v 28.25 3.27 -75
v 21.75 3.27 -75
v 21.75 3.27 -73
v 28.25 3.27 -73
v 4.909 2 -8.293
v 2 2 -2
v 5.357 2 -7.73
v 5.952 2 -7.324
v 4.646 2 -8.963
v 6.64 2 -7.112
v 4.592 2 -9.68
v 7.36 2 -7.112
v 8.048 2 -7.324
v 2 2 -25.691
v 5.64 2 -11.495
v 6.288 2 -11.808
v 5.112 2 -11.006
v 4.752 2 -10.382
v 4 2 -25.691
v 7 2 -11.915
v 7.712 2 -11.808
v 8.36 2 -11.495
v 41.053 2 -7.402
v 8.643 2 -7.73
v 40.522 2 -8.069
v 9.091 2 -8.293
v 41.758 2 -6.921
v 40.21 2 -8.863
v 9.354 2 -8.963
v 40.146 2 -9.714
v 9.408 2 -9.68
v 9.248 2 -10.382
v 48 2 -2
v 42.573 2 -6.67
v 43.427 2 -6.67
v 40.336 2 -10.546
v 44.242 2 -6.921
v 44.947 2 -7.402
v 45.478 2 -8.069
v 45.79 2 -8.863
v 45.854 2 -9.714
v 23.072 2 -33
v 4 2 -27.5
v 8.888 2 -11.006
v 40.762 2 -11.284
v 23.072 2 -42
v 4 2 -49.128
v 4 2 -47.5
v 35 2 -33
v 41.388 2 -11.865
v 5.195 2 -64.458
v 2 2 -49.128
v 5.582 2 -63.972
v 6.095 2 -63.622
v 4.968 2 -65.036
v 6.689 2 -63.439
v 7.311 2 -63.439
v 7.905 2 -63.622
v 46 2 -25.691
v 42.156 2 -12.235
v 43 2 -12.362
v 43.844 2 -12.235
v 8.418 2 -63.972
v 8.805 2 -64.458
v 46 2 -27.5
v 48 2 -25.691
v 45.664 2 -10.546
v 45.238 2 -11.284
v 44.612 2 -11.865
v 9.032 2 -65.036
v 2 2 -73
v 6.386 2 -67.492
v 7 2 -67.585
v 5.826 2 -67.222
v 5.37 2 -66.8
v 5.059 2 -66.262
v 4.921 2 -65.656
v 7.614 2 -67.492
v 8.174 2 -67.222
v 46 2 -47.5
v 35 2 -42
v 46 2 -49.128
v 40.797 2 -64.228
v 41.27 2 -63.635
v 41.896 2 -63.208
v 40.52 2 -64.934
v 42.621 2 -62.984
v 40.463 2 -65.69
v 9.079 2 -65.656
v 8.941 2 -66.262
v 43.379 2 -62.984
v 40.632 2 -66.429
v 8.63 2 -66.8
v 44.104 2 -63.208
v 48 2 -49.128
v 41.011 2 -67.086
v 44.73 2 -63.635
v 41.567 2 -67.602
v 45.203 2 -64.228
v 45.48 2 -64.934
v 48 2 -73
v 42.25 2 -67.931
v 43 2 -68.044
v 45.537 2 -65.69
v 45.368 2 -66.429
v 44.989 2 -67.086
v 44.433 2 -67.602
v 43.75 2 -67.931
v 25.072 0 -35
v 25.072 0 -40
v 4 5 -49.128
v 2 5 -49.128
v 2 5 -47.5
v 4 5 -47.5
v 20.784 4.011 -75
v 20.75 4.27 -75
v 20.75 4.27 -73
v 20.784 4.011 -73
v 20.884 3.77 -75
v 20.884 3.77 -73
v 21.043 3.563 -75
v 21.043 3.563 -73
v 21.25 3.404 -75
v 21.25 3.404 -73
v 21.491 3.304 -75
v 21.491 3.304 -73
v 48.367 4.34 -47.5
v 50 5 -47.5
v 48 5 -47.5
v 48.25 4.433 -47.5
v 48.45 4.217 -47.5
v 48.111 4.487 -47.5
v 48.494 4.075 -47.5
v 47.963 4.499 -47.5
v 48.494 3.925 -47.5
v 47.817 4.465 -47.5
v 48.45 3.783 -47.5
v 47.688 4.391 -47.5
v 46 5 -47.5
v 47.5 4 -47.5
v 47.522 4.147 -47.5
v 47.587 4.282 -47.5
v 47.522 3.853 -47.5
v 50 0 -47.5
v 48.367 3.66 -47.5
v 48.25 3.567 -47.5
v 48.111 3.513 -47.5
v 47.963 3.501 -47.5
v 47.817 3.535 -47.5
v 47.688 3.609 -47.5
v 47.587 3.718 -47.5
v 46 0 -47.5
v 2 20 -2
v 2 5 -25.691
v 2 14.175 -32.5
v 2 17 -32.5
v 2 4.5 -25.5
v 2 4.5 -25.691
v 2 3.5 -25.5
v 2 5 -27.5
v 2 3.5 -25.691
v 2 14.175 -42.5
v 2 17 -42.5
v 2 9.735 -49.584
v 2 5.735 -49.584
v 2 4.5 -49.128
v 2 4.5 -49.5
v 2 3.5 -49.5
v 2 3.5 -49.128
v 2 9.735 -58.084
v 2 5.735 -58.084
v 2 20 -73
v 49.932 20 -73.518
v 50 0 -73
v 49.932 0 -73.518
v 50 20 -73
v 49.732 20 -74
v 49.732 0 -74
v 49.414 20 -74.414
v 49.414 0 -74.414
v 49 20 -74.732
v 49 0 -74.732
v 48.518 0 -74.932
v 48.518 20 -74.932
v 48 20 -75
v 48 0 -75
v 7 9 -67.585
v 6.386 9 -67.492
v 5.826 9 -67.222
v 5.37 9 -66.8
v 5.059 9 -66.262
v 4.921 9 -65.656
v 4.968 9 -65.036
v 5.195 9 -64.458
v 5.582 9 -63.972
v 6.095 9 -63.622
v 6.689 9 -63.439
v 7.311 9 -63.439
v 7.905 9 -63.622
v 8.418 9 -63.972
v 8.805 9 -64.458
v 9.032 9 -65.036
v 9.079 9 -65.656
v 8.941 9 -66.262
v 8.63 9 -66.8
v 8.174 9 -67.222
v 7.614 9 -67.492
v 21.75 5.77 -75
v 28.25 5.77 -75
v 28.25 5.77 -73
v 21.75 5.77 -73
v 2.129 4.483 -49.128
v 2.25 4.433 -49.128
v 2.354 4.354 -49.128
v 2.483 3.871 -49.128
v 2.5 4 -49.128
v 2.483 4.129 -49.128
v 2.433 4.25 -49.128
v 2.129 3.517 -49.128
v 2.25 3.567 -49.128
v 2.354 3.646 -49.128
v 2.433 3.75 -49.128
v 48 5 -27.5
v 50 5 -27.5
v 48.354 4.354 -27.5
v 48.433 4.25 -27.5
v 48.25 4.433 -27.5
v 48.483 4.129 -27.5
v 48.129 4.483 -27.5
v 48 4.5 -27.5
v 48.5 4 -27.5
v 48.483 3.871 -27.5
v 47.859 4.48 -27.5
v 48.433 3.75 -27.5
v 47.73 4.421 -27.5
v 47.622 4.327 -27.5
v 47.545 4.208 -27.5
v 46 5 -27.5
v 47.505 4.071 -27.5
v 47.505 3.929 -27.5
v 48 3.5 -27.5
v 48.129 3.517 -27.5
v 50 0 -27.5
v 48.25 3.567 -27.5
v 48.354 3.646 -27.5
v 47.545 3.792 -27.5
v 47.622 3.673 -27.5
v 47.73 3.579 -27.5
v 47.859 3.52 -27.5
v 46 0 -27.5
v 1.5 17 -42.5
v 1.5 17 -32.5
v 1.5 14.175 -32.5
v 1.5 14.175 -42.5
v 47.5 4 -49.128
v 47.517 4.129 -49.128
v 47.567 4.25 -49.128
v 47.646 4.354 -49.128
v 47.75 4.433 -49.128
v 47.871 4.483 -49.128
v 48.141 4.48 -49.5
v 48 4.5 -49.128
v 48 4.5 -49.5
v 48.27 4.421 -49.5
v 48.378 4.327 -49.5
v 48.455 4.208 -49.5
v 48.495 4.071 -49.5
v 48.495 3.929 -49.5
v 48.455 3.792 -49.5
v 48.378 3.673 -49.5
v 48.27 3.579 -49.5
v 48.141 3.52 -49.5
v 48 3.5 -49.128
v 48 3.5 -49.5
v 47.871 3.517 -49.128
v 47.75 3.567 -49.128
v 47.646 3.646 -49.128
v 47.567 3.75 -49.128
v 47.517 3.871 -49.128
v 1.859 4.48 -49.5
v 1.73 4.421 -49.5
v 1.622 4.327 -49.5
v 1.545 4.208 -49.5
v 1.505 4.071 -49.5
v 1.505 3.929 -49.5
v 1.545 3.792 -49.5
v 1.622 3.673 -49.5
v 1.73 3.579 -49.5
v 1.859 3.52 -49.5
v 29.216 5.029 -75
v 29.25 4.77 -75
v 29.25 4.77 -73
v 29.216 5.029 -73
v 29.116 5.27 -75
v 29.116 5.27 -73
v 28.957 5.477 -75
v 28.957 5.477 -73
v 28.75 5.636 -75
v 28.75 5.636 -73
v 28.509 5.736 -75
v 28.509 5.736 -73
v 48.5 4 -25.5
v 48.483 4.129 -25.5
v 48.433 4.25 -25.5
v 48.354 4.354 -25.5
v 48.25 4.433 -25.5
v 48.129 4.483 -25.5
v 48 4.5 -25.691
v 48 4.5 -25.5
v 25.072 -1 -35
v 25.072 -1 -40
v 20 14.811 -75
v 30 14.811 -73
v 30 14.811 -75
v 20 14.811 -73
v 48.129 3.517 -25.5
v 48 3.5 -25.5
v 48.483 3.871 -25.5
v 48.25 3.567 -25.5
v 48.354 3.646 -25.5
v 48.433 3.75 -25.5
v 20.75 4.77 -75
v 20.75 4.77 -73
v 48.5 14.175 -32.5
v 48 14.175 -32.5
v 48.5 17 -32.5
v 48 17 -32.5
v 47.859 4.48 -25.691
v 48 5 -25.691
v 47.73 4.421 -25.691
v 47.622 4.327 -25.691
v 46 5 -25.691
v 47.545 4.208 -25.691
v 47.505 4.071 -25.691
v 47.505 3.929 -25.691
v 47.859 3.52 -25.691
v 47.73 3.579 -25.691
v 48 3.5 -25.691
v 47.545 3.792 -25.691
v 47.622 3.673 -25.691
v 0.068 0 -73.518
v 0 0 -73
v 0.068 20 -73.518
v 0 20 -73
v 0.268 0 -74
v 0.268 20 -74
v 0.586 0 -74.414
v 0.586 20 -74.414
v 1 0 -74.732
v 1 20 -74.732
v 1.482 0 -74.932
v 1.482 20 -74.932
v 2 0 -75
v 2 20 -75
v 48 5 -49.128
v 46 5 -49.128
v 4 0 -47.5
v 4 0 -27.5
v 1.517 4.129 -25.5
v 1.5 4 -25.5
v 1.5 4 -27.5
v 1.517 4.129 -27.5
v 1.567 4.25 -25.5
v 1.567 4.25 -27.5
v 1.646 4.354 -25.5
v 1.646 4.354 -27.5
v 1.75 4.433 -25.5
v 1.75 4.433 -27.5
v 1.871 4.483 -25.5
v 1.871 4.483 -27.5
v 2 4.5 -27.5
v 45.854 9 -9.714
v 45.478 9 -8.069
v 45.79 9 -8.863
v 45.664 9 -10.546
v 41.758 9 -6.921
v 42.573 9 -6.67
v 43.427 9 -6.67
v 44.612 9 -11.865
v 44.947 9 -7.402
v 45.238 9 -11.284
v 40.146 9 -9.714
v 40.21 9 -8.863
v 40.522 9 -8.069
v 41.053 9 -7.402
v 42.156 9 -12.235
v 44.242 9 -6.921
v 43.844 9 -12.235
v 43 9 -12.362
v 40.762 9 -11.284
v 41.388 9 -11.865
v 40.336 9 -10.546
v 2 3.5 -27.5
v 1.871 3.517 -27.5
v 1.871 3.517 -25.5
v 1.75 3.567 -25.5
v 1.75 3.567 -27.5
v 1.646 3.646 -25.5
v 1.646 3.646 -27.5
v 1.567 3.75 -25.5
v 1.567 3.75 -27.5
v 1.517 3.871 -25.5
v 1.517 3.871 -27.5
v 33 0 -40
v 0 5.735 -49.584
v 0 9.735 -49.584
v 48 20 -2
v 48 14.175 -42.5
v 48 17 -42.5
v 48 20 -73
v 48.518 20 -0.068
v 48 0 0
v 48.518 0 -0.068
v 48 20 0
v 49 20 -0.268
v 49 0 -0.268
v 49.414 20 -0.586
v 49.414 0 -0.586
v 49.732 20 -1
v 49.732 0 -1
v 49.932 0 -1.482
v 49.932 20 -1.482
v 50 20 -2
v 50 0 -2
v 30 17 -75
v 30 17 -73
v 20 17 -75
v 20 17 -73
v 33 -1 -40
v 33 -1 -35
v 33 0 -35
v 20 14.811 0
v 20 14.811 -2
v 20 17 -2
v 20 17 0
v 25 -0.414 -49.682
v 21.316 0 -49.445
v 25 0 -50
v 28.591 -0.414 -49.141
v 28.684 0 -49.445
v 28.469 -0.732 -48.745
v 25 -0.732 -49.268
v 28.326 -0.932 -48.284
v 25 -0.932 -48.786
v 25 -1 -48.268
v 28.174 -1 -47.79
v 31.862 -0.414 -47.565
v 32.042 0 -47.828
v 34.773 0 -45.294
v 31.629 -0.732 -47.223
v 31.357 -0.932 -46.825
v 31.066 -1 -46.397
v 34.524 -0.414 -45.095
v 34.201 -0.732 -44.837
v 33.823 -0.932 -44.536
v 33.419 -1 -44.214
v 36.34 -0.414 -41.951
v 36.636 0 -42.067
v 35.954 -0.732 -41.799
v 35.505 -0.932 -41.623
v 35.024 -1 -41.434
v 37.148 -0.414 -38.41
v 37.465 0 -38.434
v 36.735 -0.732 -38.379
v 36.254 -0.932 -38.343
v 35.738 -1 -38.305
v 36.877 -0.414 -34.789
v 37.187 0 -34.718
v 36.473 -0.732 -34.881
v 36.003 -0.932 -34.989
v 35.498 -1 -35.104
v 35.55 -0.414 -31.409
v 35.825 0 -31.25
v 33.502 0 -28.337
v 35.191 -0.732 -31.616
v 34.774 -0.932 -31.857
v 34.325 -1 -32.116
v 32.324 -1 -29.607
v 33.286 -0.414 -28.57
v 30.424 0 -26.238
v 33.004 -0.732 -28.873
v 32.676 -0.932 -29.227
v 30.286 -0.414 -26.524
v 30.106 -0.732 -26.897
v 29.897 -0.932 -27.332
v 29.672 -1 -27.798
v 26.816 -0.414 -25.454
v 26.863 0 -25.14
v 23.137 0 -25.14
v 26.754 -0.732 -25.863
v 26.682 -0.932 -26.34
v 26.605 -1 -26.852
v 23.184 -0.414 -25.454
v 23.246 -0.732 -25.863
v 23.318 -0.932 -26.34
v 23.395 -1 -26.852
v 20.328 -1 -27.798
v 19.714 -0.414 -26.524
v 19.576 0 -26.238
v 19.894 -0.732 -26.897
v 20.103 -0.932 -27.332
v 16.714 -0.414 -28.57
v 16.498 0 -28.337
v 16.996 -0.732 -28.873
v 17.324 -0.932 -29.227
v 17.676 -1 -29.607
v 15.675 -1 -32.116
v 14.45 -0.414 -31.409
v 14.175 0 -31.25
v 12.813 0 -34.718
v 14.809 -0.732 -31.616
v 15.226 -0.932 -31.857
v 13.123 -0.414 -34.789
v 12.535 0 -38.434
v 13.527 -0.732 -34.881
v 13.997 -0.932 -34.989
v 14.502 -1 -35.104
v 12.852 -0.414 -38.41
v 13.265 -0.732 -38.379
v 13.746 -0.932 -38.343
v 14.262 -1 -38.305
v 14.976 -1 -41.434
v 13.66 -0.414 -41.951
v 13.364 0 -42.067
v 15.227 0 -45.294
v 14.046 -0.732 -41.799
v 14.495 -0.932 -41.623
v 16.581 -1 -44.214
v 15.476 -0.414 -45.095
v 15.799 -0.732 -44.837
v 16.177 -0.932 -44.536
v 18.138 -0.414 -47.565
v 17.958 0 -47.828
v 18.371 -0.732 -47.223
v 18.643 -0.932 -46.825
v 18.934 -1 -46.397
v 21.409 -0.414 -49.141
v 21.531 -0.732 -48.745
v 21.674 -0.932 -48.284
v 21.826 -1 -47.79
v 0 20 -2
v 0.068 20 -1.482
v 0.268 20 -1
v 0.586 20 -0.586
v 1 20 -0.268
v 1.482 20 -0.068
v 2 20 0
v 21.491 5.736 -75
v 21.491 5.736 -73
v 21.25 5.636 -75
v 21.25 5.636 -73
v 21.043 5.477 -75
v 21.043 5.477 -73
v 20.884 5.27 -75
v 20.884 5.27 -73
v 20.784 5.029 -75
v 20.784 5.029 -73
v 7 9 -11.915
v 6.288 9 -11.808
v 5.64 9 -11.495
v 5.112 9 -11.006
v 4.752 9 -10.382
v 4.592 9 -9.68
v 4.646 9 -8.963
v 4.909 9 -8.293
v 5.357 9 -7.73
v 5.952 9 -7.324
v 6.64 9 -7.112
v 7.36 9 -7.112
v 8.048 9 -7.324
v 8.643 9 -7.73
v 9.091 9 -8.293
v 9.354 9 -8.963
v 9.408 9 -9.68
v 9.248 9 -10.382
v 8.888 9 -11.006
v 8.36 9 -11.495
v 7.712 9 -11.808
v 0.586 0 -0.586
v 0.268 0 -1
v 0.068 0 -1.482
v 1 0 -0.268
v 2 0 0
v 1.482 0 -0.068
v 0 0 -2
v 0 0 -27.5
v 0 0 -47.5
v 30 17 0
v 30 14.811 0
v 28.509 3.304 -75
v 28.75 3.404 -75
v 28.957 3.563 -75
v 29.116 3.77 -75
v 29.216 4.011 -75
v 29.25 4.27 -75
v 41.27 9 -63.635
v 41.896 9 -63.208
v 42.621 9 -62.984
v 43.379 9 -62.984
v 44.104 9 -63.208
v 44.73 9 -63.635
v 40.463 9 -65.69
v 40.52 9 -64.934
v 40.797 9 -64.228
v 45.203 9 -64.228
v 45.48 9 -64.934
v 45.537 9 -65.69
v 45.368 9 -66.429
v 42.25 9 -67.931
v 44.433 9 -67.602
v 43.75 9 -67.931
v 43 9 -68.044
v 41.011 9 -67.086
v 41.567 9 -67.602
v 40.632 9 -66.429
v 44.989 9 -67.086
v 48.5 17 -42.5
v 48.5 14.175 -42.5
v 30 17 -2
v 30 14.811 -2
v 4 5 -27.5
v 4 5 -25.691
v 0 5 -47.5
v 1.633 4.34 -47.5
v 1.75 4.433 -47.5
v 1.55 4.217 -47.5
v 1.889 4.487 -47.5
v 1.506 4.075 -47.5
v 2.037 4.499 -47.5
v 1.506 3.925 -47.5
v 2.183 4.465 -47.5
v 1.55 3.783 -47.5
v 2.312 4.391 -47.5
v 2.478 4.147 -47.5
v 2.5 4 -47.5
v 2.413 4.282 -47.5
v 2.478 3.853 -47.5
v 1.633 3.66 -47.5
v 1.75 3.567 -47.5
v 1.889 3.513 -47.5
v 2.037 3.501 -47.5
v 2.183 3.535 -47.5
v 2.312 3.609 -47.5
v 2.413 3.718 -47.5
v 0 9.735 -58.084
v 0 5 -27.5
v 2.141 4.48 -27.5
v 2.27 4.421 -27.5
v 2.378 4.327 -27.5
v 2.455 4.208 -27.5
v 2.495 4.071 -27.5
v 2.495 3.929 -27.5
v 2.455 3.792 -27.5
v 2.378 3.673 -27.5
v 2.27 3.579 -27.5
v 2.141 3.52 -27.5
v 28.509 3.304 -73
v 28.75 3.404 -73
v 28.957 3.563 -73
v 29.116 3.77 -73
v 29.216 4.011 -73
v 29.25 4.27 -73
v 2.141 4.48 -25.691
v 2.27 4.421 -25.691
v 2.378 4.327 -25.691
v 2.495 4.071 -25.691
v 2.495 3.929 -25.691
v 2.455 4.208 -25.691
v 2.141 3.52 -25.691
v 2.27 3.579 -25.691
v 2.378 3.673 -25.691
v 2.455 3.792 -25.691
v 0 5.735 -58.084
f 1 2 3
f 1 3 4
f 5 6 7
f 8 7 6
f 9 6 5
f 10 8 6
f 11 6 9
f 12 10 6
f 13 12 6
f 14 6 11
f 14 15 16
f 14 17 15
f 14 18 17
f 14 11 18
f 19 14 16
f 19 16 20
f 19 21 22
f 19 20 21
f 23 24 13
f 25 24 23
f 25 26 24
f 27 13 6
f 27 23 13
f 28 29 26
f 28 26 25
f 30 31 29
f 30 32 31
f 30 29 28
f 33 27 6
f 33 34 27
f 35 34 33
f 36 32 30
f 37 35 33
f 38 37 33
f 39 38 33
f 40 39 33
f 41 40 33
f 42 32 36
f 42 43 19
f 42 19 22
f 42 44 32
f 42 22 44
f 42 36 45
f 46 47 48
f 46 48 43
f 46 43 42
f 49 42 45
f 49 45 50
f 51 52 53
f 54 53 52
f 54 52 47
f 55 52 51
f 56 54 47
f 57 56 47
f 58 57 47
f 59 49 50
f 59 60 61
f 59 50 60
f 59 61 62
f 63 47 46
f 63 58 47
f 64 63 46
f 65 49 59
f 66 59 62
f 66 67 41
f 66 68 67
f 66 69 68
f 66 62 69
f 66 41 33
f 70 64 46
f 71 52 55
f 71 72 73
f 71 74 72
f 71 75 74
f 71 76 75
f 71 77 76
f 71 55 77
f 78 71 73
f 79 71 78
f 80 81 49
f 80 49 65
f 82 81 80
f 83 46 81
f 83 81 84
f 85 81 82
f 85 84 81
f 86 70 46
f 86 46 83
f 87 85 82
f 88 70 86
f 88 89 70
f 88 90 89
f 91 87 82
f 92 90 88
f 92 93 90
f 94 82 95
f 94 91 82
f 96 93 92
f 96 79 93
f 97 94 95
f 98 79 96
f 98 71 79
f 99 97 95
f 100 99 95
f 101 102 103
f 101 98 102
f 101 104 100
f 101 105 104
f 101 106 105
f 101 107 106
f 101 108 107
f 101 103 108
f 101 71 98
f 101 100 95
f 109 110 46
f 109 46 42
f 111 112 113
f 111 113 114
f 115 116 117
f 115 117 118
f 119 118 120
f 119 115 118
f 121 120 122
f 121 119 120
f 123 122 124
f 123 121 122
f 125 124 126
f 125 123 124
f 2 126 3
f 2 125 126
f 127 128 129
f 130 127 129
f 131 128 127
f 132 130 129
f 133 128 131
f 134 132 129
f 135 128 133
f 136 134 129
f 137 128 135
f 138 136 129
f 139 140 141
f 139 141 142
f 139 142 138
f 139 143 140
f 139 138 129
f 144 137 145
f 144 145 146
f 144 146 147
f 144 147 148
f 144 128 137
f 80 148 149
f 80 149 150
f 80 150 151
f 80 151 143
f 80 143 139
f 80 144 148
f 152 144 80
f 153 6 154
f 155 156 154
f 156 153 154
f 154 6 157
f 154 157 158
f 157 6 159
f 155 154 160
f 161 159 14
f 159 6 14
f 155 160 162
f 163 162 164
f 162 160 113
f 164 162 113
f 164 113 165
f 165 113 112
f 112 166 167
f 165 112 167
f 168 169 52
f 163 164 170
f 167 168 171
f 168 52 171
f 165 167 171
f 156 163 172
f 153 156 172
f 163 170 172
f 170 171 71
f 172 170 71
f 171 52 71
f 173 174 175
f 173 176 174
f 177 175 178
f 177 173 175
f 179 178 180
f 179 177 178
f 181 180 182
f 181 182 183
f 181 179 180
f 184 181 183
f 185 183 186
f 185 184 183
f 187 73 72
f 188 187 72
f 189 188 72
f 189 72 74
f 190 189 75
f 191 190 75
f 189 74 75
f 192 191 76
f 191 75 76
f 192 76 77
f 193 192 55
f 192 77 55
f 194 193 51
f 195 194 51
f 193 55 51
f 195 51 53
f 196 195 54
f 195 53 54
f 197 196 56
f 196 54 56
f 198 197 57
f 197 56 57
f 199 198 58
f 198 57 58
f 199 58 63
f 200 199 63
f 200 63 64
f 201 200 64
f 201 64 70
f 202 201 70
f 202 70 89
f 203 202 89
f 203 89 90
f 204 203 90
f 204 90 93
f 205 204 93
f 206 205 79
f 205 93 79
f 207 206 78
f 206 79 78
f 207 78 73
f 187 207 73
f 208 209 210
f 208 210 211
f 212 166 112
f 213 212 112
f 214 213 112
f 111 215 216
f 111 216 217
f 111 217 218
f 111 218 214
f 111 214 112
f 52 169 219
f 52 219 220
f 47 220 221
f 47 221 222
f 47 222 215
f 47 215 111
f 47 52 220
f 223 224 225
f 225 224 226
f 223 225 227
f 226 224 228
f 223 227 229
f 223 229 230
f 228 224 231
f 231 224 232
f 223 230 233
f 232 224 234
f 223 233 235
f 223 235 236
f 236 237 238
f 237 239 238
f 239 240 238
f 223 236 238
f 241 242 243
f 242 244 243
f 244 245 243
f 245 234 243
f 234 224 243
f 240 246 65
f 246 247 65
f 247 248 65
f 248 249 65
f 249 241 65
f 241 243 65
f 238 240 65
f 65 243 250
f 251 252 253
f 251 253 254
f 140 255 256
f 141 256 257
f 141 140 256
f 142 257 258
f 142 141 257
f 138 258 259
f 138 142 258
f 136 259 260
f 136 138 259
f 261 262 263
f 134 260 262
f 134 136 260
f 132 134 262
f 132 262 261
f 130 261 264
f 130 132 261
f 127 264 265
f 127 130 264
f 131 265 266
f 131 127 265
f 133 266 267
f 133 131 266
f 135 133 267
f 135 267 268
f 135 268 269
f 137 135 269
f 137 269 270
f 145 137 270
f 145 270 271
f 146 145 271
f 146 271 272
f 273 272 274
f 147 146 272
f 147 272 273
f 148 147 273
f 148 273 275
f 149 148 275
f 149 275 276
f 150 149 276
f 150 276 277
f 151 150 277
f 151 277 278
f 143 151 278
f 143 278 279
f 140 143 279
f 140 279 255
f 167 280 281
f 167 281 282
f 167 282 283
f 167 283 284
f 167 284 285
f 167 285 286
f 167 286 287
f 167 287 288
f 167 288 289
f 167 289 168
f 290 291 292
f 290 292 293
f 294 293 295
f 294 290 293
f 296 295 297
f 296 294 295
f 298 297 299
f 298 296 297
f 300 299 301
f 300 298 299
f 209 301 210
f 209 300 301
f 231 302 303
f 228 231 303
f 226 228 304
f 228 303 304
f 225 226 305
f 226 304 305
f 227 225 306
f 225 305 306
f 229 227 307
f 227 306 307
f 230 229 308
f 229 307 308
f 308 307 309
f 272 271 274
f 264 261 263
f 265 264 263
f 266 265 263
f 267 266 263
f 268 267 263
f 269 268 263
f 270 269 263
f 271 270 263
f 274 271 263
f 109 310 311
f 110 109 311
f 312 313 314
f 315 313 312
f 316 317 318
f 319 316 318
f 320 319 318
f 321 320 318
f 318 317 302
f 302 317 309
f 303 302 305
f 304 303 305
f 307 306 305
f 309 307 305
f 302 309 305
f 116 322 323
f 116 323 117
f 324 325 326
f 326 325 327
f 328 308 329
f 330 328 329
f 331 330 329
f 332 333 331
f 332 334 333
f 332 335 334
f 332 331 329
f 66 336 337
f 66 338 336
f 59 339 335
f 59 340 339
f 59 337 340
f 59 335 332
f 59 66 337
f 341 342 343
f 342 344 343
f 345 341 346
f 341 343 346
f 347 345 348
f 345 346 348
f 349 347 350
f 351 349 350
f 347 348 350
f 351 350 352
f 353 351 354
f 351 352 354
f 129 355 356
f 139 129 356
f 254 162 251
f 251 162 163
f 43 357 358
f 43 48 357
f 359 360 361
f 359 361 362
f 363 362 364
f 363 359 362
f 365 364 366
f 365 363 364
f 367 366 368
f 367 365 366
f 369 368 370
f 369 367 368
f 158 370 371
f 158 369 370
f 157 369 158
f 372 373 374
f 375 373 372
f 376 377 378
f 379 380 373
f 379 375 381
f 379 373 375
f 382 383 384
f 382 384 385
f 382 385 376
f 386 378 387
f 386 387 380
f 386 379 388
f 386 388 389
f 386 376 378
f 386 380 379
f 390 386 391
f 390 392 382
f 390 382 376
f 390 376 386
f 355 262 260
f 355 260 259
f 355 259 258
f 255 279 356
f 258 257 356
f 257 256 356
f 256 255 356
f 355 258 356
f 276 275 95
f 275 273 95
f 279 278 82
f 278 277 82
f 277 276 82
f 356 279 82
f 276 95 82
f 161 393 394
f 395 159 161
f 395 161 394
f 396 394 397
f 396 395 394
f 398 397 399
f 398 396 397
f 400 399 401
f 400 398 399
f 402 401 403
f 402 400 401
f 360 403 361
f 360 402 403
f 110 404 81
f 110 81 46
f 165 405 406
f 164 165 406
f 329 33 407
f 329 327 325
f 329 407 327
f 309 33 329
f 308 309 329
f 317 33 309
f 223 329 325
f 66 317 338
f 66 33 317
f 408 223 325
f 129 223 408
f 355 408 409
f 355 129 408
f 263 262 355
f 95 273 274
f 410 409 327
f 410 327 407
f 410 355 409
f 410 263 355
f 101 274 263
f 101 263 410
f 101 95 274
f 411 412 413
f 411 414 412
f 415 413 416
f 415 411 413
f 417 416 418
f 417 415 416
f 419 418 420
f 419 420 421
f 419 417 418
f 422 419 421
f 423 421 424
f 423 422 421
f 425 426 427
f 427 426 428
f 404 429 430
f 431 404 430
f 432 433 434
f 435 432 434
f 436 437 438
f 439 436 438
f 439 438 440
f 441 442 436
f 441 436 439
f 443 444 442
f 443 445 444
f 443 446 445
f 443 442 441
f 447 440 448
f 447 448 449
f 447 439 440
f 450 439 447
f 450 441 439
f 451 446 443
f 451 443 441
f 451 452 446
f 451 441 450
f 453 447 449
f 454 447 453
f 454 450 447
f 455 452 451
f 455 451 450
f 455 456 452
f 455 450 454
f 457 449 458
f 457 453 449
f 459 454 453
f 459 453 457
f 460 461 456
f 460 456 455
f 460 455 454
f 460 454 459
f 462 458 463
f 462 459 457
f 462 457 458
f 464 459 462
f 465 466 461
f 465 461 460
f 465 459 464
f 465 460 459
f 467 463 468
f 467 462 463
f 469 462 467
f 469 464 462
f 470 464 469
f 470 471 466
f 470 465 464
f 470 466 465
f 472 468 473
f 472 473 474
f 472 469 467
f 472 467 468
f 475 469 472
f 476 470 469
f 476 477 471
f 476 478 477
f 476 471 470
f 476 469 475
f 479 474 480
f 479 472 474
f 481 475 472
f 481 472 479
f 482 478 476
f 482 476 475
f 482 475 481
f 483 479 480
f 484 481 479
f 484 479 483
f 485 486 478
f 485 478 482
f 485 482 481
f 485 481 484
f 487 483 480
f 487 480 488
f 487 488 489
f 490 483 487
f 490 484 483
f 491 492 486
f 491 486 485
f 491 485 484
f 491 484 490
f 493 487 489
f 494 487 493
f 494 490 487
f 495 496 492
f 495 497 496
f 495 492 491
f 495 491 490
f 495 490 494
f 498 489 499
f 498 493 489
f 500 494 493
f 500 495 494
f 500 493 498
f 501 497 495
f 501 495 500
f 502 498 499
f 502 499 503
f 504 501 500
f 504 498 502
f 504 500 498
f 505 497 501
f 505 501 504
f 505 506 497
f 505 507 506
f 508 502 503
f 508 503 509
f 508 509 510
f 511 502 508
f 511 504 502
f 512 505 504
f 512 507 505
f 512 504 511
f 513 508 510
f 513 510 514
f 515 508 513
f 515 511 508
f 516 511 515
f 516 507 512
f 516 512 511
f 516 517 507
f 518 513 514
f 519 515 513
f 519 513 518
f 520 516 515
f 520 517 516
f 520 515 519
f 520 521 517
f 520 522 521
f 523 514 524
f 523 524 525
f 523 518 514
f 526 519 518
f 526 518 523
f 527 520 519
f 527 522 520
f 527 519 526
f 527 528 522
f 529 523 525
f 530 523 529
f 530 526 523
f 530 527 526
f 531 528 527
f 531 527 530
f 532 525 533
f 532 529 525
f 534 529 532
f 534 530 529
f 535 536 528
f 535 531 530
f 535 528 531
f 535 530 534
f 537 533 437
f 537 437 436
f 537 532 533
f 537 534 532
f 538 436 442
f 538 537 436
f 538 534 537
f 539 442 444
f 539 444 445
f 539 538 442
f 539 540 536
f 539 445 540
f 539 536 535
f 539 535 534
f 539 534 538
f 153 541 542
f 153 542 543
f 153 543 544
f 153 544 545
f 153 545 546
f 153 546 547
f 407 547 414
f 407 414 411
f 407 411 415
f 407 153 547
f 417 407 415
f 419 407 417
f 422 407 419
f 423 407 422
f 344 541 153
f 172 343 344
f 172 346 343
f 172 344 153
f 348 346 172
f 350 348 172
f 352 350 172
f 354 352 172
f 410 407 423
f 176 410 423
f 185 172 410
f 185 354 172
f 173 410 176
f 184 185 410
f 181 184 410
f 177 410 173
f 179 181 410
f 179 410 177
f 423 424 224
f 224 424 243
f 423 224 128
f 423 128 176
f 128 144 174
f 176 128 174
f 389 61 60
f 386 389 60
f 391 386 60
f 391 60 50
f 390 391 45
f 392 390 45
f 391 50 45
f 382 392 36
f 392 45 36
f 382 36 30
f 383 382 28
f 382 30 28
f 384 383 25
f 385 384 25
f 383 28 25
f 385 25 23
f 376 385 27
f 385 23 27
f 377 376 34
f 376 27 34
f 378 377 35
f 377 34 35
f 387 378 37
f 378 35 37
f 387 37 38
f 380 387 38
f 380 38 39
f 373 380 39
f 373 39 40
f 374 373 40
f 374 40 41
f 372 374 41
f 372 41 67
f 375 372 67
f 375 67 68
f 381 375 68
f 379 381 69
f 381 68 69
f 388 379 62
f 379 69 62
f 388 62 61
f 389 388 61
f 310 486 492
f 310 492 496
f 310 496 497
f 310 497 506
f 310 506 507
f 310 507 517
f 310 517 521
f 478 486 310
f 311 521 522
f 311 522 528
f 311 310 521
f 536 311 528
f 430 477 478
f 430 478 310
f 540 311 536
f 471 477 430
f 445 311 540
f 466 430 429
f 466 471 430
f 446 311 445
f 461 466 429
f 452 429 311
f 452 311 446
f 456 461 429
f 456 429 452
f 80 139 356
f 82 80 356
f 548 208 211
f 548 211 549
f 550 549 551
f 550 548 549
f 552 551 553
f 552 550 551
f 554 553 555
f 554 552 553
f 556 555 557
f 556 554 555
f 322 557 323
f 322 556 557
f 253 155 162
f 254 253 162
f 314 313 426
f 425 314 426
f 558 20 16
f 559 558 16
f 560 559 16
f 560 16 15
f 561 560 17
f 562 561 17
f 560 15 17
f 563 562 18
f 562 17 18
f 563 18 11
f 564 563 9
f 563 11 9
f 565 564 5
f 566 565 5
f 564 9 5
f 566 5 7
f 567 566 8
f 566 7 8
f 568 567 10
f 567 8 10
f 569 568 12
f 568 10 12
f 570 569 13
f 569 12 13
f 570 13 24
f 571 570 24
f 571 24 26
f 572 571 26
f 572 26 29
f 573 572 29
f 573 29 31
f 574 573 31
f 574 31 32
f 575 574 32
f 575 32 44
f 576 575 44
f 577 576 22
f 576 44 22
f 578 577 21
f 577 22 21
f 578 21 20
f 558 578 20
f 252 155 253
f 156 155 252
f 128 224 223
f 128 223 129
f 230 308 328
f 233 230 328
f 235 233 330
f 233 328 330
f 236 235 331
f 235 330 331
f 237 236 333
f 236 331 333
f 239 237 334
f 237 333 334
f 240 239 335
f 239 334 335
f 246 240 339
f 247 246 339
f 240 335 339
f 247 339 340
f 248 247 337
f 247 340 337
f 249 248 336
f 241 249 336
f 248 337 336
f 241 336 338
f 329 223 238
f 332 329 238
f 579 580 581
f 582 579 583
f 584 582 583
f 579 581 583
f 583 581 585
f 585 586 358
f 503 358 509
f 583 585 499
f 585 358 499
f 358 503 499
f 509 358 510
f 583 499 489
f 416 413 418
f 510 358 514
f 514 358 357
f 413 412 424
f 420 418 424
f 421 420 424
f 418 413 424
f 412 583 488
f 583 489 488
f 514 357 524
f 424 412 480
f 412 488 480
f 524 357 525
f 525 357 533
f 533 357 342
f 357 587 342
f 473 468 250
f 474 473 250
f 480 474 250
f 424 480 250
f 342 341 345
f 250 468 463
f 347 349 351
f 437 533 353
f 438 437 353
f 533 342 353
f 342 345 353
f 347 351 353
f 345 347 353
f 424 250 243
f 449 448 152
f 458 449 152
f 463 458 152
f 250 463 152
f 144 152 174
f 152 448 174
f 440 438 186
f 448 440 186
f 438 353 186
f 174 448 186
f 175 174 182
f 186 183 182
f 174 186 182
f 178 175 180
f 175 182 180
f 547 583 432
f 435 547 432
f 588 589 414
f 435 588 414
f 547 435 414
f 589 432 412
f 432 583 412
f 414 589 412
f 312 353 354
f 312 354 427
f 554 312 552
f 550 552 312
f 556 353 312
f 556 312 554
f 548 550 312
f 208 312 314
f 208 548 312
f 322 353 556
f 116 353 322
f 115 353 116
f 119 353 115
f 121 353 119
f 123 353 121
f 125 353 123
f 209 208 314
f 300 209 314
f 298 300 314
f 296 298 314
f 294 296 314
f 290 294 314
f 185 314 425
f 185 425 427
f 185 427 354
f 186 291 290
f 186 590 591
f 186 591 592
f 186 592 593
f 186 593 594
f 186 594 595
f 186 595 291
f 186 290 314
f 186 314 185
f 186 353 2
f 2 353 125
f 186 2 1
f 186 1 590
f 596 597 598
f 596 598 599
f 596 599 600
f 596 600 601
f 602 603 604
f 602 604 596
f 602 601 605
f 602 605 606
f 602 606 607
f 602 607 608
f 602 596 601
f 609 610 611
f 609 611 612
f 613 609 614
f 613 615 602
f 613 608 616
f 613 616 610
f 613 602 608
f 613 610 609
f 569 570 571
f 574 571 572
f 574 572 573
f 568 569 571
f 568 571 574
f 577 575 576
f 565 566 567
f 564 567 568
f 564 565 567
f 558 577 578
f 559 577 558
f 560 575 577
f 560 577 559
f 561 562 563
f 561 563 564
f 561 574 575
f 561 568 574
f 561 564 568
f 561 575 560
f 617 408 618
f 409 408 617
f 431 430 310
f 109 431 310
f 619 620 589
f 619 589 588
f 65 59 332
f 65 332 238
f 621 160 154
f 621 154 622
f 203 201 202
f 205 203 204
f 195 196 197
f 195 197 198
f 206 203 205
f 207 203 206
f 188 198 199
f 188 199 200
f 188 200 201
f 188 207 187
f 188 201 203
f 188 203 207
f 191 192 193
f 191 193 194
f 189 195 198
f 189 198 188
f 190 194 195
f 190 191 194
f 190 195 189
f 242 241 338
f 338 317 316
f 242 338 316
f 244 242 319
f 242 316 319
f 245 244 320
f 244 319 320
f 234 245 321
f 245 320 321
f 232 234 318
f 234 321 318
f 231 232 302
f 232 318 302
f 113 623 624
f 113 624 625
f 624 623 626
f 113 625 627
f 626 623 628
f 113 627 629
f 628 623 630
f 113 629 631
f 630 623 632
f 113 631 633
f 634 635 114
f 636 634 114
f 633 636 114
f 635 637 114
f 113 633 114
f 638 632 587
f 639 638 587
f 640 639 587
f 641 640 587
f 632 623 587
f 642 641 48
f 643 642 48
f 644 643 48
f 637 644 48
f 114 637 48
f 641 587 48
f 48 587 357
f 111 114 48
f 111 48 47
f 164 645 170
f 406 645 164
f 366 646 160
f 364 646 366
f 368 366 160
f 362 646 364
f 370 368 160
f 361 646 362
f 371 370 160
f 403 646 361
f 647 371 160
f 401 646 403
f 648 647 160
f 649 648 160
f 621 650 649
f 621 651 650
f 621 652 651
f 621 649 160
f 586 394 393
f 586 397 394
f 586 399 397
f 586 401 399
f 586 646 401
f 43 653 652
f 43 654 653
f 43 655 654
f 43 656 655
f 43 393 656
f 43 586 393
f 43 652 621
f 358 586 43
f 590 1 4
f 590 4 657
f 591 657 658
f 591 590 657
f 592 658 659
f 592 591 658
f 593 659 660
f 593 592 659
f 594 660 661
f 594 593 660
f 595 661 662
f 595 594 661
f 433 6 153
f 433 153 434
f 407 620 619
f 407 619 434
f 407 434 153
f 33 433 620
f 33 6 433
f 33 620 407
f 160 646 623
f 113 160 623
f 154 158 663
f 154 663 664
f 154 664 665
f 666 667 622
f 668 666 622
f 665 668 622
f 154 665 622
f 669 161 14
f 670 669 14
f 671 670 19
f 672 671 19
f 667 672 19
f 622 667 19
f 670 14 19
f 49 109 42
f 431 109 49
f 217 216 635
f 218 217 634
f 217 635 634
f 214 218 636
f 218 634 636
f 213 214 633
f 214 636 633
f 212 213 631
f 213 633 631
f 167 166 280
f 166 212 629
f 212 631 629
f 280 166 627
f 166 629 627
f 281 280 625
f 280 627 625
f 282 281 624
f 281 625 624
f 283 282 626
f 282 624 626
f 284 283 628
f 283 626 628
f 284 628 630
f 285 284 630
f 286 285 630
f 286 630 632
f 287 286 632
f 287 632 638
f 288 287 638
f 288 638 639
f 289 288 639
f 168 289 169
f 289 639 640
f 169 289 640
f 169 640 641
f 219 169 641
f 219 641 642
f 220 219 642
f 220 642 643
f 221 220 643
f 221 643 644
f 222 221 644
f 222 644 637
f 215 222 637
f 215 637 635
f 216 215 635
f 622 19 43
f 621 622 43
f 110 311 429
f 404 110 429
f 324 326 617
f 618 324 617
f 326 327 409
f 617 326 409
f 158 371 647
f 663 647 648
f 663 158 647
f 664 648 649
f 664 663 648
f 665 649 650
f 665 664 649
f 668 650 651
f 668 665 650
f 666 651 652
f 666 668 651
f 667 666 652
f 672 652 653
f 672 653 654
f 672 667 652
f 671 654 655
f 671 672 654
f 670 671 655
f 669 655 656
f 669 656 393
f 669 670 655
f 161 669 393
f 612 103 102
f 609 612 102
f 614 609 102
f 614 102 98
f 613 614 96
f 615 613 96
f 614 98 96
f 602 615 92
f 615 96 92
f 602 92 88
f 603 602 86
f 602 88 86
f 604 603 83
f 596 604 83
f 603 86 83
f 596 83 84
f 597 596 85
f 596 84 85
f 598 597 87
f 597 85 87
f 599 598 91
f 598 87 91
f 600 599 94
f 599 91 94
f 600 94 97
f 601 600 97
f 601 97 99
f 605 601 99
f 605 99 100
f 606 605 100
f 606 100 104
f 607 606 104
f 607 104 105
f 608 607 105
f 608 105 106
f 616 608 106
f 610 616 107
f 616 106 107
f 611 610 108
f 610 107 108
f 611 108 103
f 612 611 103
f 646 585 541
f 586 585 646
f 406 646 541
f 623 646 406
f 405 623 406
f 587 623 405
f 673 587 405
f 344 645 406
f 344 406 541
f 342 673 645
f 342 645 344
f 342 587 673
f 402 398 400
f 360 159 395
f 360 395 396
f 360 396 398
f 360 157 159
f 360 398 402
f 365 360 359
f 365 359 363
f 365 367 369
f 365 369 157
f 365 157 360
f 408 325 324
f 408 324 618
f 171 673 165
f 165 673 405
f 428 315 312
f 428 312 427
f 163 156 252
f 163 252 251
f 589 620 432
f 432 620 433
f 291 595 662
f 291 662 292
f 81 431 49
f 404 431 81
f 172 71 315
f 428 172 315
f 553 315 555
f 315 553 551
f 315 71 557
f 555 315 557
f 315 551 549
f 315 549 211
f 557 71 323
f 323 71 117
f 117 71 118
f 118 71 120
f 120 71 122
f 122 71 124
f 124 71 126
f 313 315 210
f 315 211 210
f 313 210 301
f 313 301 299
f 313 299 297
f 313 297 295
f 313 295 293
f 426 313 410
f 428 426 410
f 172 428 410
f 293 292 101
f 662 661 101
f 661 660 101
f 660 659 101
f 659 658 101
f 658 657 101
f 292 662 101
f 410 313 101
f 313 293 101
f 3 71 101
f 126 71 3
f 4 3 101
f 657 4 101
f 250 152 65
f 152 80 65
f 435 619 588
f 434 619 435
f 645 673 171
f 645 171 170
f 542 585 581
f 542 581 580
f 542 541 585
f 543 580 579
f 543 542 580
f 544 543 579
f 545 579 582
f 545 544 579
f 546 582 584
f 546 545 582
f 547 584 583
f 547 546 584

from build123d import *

# Parameters (mm, degrees)
SKETCH1_W           = 50
SKETCH1_H           = 75
BOSS_EXTRUDE1_DEPTH = 20
SHELL1_T            = -2
FILLET1_R           = 2
SKETCH2_R           = 12.5
BOSS_EXTRUDE2_DEPTH = 1
FILLET2_R           = 2
CUT_EXTRUDE1_DEPTH  = 5
SKETCH4_R           = 2.084715902
SKETCH4_R_2         = 2.544136108
SKETCH4_R_3         = 2.861924979
SKETCH4_R_4         = 2.414925707
BOSS_EXTRUDE3_DEPTH = 7
CHAMFER1_SIZE       = 2
CUT_EXTRUDE2_DEPTH  = 4
SKETCH7_W           = 2
SKETCH7_H           = 1.627577662
BOSS_EXTRUDE4_DEPTH = 3
SKETCH8_W           = 2
SKETCH8_H           = 1.808898565
BOSS_EXTRUDE5_DEPTH = 3
SKETCH9_R           = 0.5
CUT_EXTRUDE3_DEPTH  = 2
CUT_EXTRUDE4_START  = -2
CUT_EXTRUDE4_DEPTH  = 2
SKETCH12_W          = 8.5
SKETCH12_H          = 4
CUT_EXTRUDE5_DEPTH  = 3
SKETCH14_W          = 10
SKETCH14_H          = 2.18902829
CUT_EXTRUDE7_DEPTH  = 3
SKETCH15_W          = 10
SKETCH15_H          = 2.825004844
CUT_EXTRUDE8_DEPTH  = 0.5
CUT_EXTRUDE9_DEPTH  = 3


with BuildPart() as part:
    # Sketch1 → Boss-Extrude1 (new body)
    with BuildSketch(Plane(origin=(0, 0, 0), x_dir=(1, 0, 0), z_dir=(0, 1, 0))):
        with Locations((25, 37.5)):
            Rectangle(SKETCH1_W, SKETCH1_H)
    extrude(amount=BOSS_EXTRUDE1_DEPTH)

    # Shell1
    shell1_openings = [part.faces().sort_by_distance(p)[0] for p in [
        (25, 20, -37.5),
    ]]
    offset(amount=SHELL1_T, openings=shell1_openings, kind=Kind.INTERSECTION)

    # Fillet1
    fillet1_edges = [part.edges().sort_by_distance(p)[0] for p in [
        (0, 10, -75),
        (50, 10, -75),
        (50, 10, 0),
        (0, 10, 0),
    ]]
    fillet(fillet1_edges, radius=FILLET1_R)

    # Sketch2 → Boss-Extrude2 (add)
    with BuildSketch(Plane.XZ):
        with Locations(Location((25, -37.5, 0), (0, 0, 270))):
            Circle(SKETCH2_R)
    extrude(amount=BOSS_EXTRUDE2_DEPTH)

    # Fillet2
    # the kernel refuses this fillet: 2 mm, written as the material it takes off along each edge
    with BuildSketch(Plane(origin=(25, -1, -37.5), x_dir=(0, 0, -1), z_dir=(-1, 0, 0))) as fillet2_piece_1:
        with BuildLine():
            CenterArc((10.767949192, -2), FILLET2_R, 30, 60)
            Line((10.767949192, 0), (10.767949192, 0.04))
            Line((10.767949192, 0.04), (12.5, 0.04))
            Line((12.5, 0.04), (12.54, 0))
            ThreePointArc((12.54, 0), (12.54, -0.5), (12.534641016, -0.98))
            Line((12.534641016, -0.98), (12.5, -1))
        make_face()
    revolve(axis=Axis((25, -1, -37.5), (0, -1, 0)), mode=Mode.SUBTRACT)

    # Sketch3 → Cut-Extrude1 (cut)
    with BuildSketch(Plane.XZ.offset(1)):
        Polygon((33, -40), (33, -37.5), (33, -35), (25.072423756, -35), (25.072423756, -37.5), (25.072423756, -40), align=None)
    extrude(amount=-CUT_EXTRUDE1_DEPTH, mode=Mode.SUBTRACT)

    # Sketch4 → Boss-Extrude3 (add)
    with BuildSketch(Plane(origin=(0, 2, 0), x_dir=(1, 0, 0), z_dir=(0, 1, 0))):
        with Locations(Location((7, 65.5, 0), (0, 0, 90))):
            Circle(SKETCH4_R)
        with Locations(Location((43, 65.5, 0), (0, 0, 90))):
            Circle(SKETCH4_R_2)
        with Locations(Location((43, 9.5, 0), (0, 0, 90))):
            Circle(SKETCH4_R_3)
        with Locations(Location((7, 9.5, 0), (0, 0, 90))):
            Circle(SKETCH4_R_4)
    extrude(amount=BOSS_EXTRUDE3_DEPTH)

    # Chamfer1
    chamfer1_edges = [part.edges().sort_by_distance(p)[0] for p in [
        (33, 2, -37.5),
        (29.036211878, 2, -40),
        (29.036211878, 2, -35),
        (25.072423756, 2, -37.5),
    ]]
    chamfer(chamfer1_edges, length=CHAMFER1_SIZE)

    # Sketch5 → Cut-Extrude2 (cut)
    with BuildSketch(Plane.ZY):
        Polygon((-37.5, 0), (-27.5, 0), (-27.5, 5), (-47.5, 5), (-47.5, 0), align=None)
    cut_extrude2 = extrude(amount=-CUT_EXTRUDE2_DEPTH, mode=Mode.SUBTRACT)

    # Sketch7 → Boss-Extrude4 (add)
    with BuildSketch(Plane(origin=(0, 2, 0), x_dir=(1, 0, 0), z_dir=(0, 1, 0))):
        with Locations((3, 48.313788831)):
            Rectangle(SKETCH7_W, SKETCH7_H)
    boss_extrude4 = extrude(amount=BOSS_EXTRUDE4_DEPTH)

    # Sketch8 → Boss-Extrude5 (add)
    with BuildSketch(Plane(origin=(0, 2, 0), x_dir=(1, 0, 0), z_dir=(0, 1, 0))):
        with Locations((3, 26.595550718)):
            Rectangle(SKETCH8_W, SKETCH8_H)
    boss_extrude5 = extrude(amount=BOSS_EXTRUDE5_DEPTH)

    # Sketch9 → Cut-Extrude3 (cut)
    with BuildSketch(Plane.XY.offset(-47.5)):
        with Locations((2, 4)):
            Circle(SKETCH9_R)
    cut_extrude3 = extrude(amount=-CUT_EXTRUDE3_DEPTH, mode=Mode.SUBTRACT)

    # Sketch10 → Cut-Extrude4 (cut)
    with BuildSketch(Plane(origin=(0, 0, -27.5), x_dir=(-1, 0, 0), z_dir=(0, 0, -1)).offset(CUT_EXTRUDE4_START)):
        with BuildLine():
            ThreePointArc((-1.5, 4), (-1.646446609, 4.353553391), (-2, 4.5))
            Line((-2, 4.5), (-2, 3.5))
            ThreePointArc((-2, 3.5), (-1.646446609, 3.646446609), (-1.5, 4))
        make_face()
        with BuildLine():
            Line((-2, 3.5), (-2, 4.5))
            ThreePointArc((-2, 4.5), (-2.5, 4), (-2, 3.5))
        make_face()
    cut_extrude4 = extrude(amount=CUT_EXTRUDE4_DEPTH, mode=Mode.SUBTRACT)

    # Mirror1: Cut-Extrude2, Boss-Extrude4, Boss-Extrude5, Cut-Extrude3, Cut-Extrude4 across plane
    add(cut_extrude2.mirror(Plane(origin=(25, 0, 0), x_dir=(0, 0, 1), z_dir=(1, 0, 0))), mode=Mode.SUBTRACT)
    add(boss_extrude4.mirror(Plane(origin=(25, 0, 0), x_dir=(0, 0, 1), z_dir=(1, 0, 0))))
    add(boss_extrude5.mirror(Plane(origin=(25, 0, 0), x_dir=(0, 0, 1), z_dir=(1, 0, 0))))
    add(cut_extrude3.mirror(Plane(origin=(25, 0, 0), x_dir=(0, 0, 1), z_dir=(1, 0, 0))), mode=Mode.SUBTRACT)
    add(cut_extrude4.mirror(Plane(origin=(25, 0, 0), x_dir=(0, 0, 1), z_dir=(1, 0, 0))), mode=Mode.SUBTRACT)

    # Sketch12 → Cut-Extrude5 (cut)
    with BuildSketch(Plane.ZY):
        with Locations((-53.834118064, 7.735405472)):
            Rectangle(SKETCH12_W, SKETCH12_H)
    extrude(amount=-CUT_EXTRUDE5_DEPTH, mode=Mode.SUBTRACT)

    # Sketch14 → Cut-Extrude7 (cut)
    with BuildSketch(Plane(origin=(0, 0, -2), x_dir=(-1, 0, 0), z_dir=(0, 0, -1))):
        with Locations((-25, 15.905485855)):
            Rectangle(SKETCH14_W, SKETCH14_H)
    cut_extrude7 = extrude(amount=-CUT_EXTRUDE7_DEPTH, mode=Mode.SUBTRACT)

    # Sketch15 → Cut-Extrude8 (cut)
    with BuildSketch(Plane(origin=(2, 0, 0), x_dir=(0, 0, -1), z_dir=(1, 0, 0))):
        with Locations((37.5, 15.587497578)):
            Rectangle(SKETCH15_W, SKETCH15_H)
    cut_extrude8 = extrude(amount=-CUT_EXTRUDE8_DEPTH, mode=Mode.SUBTRACT)

    # Mirror2: Cut-Extrude7 across plane
    add(cut_extrude7.mirror(Plane.XY.offset(-37.5)), mode=Mode.SUBTRACT)

    # Mirror3: Cut-Extrude8 across plane
    add(cut_extrude8.mirror(Plane(origin=(25, 0, 0), x_dir=(0, 0, 1), z_dir=(1, 0, 0))), mode=Mode.SUBTRACT)

    # Sketch16 → Cut-Extrude9 (cut)
    with BuildSketch(Plane(origin=(0, 0, -75), x_dir=(-1, 0, 0), z_dir=(0, 0, -1))):
        with BuildLine():
            Line((-28.25, 5.769790366), (-21.75, 5.769790366))
            ThreePointArc((-21.75, 5.769790366), (-21.042893219, 5.476897147), (-20.75, 4.769790366))
            Line((-20.75, 4.769790366), (-20.75, 4.269790366))
            ThreePointArc((-20.75, 4.269790366), (-21.042893219, 3.562683585), (-21.75, 3.269790366))
            Line((-21.75, 3.269790366), (-28.25, 3.269790366))
            ThreePointArc((-28.25, 3.269790366), (-28.957106781, 3.562683585), (-29.25, 4.269790366))
            Line((-29.25, 4.269790366), (-29.25, 4.769790366))
            ThreePointArc((-29.25, 4.769790366), (-28.957106781, 5.476897147), (-28.25, 5.769790366))
        make_face()
    extrude(amount=-CUT_EXTRUDE9_DEPTH, mode=Mode.SUBTRACT)


solid = part.part
